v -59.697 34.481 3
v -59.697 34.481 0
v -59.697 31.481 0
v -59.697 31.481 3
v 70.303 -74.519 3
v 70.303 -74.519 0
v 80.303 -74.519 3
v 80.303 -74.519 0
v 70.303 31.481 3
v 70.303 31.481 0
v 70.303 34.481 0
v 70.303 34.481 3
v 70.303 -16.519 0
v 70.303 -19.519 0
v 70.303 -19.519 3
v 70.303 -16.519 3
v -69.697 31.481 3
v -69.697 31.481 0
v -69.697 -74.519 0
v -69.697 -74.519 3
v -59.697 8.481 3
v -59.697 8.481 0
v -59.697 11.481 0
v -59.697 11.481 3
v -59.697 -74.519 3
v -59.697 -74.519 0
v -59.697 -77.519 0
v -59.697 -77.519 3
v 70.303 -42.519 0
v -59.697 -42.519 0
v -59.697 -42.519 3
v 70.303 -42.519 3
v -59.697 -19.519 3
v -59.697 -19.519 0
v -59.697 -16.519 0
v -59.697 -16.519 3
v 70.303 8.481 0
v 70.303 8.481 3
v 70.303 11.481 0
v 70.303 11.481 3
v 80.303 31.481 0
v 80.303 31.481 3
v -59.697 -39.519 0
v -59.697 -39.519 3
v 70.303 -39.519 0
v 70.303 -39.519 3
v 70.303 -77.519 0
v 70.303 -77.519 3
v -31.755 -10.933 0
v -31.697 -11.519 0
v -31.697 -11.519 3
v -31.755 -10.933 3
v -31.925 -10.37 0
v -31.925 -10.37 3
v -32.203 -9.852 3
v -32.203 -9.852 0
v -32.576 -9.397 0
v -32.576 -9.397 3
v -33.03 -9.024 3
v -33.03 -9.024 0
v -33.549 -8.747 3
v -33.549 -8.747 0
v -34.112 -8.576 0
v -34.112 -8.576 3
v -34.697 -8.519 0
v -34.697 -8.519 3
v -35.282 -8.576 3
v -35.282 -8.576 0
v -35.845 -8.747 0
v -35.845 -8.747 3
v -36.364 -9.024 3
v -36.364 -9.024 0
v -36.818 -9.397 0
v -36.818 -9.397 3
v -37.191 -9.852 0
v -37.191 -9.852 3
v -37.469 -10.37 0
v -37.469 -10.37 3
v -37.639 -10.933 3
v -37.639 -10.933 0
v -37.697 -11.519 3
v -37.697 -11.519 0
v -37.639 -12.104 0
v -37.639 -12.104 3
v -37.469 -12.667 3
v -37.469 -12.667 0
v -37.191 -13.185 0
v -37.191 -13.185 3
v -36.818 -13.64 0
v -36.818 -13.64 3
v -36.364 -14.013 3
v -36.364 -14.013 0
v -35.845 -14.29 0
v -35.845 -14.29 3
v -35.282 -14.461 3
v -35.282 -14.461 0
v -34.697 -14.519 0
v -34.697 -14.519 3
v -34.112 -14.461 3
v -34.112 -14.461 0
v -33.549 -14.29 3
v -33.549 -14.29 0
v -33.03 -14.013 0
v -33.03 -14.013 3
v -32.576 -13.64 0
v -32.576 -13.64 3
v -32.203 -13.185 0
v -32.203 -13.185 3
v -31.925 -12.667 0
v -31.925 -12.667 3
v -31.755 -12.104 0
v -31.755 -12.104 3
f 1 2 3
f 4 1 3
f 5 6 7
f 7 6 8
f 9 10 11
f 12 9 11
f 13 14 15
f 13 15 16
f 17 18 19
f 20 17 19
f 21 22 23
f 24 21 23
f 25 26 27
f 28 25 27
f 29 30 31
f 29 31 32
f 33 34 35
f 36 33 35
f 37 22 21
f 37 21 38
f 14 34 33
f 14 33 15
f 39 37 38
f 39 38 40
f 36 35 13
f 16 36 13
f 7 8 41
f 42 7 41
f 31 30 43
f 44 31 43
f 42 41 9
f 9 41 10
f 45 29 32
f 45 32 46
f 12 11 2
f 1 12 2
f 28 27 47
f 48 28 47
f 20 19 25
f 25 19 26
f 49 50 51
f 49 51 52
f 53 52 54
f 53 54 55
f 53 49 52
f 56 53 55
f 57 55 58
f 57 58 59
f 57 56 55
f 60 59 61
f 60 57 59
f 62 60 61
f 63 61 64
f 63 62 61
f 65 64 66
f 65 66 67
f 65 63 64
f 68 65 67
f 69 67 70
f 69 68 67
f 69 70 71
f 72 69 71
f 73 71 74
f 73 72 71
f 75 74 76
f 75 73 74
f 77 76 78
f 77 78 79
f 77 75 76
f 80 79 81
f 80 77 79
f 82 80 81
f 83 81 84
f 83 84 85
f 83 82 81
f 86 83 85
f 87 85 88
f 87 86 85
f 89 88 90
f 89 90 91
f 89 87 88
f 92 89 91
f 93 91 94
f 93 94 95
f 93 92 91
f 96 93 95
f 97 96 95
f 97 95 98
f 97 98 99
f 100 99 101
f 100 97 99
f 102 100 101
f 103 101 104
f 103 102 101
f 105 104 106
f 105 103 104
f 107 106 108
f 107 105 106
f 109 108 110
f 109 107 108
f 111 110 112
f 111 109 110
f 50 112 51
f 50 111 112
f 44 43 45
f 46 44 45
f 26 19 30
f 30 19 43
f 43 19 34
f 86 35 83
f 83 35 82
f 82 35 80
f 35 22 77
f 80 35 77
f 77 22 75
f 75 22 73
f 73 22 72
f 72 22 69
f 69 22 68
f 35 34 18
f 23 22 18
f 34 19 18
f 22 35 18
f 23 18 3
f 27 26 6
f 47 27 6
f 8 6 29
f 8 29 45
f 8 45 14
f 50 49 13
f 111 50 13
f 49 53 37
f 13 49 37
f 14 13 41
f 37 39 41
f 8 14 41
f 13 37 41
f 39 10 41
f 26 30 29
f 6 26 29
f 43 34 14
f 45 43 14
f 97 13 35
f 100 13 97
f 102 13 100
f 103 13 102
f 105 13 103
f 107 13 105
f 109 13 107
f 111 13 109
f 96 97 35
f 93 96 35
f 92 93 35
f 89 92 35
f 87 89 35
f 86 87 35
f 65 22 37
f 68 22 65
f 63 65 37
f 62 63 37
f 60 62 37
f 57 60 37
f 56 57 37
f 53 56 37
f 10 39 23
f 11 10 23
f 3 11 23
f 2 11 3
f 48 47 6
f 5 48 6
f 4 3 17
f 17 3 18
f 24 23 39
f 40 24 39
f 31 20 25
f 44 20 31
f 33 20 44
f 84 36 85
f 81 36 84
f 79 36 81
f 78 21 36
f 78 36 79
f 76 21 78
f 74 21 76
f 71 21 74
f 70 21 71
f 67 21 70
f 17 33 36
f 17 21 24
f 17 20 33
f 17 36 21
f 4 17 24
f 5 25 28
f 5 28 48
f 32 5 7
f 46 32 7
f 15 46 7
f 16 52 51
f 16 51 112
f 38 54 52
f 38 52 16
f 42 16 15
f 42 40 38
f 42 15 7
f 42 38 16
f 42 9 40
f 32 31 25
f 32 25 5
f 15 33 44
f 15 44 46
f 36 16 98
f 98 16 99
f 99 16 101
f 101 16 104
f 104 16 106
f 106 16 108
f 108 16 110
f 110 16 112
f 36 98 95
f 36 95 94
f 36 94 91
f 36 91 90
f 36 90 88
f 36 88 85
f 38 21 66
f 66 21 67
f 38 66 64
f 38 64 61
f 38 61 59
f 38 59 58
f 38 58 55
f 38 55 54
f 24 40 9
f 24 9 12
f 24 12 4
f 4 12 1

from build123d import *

# Parameters (mm, degrees)
SKETCH1_W           = 130
SKETCH1_H           = 3
SKETCH1_R           = 3
BOSS_EXTRUDE1_DEPTH = 3


with BuildPart() as part:
    # Sketch1 → Boss-Extrude1 (new body)
    with BuildSketch(Plane.XY):
        Polygon((70.303030303, 34.481481481), (-59.696969697, 34.481481481), (-59.696969697, 31.481481481), (-69.696969697, 31.481481481), (-69.696969697, -74.518518519), (-59.696969697, -74.518518519), (-59.696969697, -77.518518519), (70.303030303, -77.518518519), (70.303030303, -74.518518519), (80.303030303, -74.518518519), (80.303030303, 31.481481481), (70.303030303, 31.481481481), align=None)
        with Locations((5.303030303, -41.018518519)):
            Rectangle(SKETCH1_W, SKETCH1_H, mode=Mode.SUBTRACT)
        with Locations((-34.696969697, -11.518518519)):
            Circle(SKETCH1_R, mode=Mode.SUBTRACT)
        with Locations((5.303030303, -18.018518519)):
            Rectangle(SKETCH1_W, SKETCH1_H, mode=Mode.SUBTRACT)
        with Locations((5.303030303, 9.981481481)):
            Rectangle(SKETCH1_W, SKETCH1_H, mode=Mode.SUBTRACT)
    extrude(amount=BOSS_EXTRUDE1_DEPTH)


solid = part.part
